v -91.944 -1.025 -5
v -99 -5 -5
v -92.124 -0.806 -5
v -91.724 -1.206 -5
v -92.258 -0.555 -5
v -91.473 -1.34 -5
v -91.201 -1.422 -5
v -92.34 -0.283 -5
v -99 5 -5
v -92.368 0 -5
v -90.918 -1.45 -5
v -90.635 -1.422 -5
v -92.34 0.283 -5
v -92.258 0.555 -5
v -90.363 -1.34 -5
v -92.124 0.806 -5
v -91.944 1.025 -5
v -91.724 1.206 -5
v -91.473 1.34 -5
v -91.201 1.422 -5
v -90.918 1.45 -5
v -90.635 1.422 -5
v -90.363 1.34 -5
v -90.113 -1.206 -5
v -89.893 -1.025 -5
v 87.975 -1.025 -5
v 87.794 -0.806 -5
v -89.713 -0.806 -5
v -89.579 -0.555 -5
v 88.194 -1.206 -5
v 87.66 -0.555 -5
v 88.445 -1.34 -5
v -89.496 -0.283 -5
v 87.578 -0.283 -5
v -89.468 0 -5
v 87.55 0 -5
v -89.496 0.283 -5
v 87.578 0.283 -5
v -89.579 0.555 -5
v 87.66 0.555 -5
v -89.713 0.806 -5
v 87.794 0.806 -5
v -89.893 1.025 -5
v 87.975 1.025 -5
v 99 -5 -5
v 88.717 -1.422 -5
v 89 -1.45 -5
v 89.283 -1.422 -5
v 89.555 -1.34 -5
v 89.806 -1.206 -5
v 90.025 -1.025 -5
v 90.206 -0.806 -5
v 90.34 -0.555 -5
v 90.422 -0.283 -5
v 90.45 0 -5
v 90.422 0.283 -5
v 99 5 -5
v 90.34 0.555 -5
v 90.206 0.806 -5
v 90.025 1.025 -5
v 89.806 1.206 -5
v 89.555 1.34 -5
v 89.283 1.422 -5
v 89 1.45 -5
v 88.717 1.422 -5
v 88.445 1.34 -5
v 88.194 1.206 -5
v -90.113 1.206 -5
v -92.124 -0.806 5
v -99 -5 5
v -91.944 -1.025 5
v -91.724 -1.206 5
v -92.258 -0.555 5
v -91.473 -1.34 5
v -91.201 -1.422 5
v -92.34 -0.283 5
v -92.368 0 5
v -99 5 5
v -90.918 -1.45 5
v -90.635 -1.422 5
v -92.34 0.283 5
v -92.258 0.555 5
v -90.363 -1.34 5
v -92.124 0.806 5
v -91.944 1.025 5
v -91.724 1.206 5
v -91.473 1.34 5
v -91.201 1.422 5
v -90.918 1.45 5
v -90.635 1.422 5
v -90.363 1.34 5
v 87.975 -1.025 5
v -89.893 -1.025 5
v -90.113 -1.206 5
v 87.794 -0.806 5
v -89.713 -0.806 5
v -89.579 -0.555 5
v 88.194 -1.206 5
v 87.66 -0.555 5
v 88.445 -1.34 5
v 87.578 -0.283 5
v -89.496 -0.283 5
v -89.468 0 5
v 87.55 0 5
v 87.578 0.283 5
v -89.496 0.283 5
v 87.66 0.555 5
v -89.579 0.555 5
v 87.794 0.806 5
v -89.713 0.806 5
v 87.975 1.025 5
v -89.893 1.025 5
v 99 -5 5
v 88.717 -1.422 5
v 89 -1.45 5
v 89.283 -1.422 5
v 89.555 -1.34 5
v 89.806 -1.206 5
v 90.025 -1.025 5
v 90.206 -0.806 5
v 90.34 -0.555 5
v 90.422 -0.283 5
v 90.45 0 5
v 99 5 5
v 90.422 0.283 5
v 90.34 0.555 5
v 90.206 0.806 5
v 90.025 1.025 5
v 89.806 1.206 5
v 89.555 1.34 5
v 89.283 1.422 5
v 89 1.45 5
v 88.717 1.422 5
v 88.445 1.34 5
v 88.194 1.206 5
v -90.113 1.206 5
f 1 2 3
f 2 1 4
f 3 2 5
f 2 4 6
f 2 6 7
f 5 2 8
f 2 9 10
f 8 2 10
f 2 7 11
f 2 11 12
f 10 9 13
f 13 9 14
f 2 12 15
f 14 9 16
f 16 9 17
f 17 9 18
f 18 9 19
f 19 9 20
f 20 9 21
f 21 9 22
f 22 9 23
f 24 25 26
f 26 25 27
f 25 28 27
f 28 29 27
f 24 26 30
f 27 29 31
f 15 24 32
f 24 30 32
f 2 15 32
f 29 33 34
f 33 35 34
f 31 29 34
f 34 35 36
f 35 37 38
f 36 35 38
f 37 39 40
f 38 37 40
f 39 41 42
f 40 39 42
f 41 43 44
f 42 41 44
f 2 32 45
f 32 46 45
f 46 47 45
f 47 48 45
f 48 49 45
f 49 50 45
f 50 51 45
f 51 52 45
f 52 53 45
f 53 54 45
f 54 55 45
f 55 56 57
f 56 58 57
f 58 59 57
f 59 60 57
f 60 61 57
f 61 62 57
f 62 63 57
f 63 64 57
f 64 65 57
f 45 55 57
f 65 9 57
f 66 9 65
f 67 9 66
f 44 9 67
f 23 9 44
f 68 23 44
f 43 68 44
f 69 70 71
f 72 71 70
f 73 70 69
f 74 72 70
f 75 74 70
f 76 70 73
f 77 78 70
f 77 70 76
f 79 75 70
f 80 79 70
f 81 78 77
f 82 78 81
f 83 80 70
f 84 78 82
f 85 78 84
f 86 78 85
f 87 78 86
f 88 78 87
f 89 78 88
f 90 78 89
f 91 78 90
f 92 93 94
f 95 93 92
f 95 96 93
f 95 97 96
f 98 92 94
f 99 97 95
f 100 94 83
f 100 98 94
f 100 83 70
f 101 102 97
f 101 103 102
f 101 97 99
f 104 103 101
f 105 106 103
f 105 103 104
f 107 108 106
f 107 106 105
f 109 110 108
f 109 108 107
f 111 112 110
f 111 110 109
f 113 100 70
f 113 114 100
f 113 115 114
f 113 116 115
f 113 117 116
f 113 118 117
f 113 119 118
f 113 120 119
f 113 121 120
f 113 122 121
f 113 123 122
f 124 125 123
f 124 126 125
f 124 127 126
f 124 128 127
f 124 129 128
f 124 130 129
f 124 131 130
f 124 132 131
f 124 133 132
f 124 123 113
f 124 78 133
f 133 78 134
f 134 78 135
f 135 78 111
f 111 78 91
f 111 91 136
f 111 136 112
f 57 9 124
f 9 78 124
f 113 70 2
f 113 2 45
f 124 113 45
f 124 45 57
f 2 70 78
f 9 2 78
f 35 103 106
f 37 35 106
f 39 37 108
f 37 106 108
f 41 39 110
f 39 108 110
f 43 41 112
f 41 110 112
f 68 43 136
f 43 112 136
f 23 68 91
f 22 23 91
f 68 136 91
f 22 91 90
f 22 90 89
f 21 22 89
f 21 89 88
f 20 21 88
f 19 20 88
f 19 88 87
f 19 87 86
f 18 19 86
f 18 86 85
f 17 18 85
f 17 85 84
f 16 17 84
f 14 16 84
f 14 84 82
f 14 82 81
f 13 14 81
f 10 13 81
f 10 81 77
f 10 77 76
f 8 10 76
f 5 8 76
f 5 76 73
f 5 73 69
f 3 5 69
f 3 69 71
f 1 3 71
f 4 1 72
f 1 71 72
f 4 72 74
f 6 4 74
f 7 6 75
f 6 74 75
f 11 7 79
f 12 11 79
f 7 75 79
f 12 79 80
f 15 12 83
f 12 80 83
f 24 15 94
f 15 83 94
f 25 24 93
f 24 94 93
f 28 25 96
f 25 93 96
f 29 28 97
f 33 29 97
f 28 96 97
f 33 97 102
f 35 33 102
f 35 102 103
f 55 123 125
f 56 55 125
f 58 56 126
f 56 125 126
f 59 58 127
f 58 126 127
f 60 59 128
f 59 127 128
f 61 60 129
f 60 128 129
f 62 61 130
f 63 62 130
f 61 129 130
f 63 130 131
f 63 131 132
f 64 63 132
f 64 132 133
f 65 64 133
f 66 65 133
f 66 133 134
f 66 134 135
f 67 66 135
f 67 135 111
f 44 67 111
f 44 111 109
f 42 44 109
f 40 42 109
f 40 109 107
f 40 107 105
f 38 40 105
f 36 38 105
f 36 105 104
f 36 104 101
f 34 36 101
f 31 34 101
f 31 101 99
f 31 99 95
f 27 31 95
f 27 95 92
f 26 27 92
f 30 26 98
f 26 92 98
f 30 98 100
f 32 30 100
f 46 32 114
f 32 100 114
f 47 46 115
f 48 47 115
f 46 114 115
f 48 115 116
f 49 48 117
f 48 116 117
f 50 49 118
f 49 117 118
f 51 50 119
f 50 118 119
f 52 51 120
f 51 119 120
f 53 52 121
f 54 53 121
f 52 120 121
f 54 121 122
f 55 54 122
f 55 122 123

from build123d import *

# Parameters (mm, degrees)
SKETCH1_W              = 198
SKETCH1_H              = 10
BOSS_EXTRUDE1_DEPTH    = 5
M2_5_CLEARANCE_HOLE1_D = 2.9


with BuildPart() as part:
    # Sketch1 → Boss-Extrude1 (new, symmetric)
    with BuildSketch(Plane.XY):
        Rectangle(SKETCH1_W, SKETCH1_H)
    extrude(amount=BOSS_EXTRUDE1_DEPTH, both=True)

    # M2.5 Clearance Hole1 (through all)
    with Locations(Plane(origin=(0, 0, -5), x_dir=(-1, 0, 0), z_dir=(0, 0, -1))):
        with Locations((-89, 0), (90.9182, 0)):
            Hole(M2_5_CLEARANCE_HOLE1_D / 2)


solid = part.part
